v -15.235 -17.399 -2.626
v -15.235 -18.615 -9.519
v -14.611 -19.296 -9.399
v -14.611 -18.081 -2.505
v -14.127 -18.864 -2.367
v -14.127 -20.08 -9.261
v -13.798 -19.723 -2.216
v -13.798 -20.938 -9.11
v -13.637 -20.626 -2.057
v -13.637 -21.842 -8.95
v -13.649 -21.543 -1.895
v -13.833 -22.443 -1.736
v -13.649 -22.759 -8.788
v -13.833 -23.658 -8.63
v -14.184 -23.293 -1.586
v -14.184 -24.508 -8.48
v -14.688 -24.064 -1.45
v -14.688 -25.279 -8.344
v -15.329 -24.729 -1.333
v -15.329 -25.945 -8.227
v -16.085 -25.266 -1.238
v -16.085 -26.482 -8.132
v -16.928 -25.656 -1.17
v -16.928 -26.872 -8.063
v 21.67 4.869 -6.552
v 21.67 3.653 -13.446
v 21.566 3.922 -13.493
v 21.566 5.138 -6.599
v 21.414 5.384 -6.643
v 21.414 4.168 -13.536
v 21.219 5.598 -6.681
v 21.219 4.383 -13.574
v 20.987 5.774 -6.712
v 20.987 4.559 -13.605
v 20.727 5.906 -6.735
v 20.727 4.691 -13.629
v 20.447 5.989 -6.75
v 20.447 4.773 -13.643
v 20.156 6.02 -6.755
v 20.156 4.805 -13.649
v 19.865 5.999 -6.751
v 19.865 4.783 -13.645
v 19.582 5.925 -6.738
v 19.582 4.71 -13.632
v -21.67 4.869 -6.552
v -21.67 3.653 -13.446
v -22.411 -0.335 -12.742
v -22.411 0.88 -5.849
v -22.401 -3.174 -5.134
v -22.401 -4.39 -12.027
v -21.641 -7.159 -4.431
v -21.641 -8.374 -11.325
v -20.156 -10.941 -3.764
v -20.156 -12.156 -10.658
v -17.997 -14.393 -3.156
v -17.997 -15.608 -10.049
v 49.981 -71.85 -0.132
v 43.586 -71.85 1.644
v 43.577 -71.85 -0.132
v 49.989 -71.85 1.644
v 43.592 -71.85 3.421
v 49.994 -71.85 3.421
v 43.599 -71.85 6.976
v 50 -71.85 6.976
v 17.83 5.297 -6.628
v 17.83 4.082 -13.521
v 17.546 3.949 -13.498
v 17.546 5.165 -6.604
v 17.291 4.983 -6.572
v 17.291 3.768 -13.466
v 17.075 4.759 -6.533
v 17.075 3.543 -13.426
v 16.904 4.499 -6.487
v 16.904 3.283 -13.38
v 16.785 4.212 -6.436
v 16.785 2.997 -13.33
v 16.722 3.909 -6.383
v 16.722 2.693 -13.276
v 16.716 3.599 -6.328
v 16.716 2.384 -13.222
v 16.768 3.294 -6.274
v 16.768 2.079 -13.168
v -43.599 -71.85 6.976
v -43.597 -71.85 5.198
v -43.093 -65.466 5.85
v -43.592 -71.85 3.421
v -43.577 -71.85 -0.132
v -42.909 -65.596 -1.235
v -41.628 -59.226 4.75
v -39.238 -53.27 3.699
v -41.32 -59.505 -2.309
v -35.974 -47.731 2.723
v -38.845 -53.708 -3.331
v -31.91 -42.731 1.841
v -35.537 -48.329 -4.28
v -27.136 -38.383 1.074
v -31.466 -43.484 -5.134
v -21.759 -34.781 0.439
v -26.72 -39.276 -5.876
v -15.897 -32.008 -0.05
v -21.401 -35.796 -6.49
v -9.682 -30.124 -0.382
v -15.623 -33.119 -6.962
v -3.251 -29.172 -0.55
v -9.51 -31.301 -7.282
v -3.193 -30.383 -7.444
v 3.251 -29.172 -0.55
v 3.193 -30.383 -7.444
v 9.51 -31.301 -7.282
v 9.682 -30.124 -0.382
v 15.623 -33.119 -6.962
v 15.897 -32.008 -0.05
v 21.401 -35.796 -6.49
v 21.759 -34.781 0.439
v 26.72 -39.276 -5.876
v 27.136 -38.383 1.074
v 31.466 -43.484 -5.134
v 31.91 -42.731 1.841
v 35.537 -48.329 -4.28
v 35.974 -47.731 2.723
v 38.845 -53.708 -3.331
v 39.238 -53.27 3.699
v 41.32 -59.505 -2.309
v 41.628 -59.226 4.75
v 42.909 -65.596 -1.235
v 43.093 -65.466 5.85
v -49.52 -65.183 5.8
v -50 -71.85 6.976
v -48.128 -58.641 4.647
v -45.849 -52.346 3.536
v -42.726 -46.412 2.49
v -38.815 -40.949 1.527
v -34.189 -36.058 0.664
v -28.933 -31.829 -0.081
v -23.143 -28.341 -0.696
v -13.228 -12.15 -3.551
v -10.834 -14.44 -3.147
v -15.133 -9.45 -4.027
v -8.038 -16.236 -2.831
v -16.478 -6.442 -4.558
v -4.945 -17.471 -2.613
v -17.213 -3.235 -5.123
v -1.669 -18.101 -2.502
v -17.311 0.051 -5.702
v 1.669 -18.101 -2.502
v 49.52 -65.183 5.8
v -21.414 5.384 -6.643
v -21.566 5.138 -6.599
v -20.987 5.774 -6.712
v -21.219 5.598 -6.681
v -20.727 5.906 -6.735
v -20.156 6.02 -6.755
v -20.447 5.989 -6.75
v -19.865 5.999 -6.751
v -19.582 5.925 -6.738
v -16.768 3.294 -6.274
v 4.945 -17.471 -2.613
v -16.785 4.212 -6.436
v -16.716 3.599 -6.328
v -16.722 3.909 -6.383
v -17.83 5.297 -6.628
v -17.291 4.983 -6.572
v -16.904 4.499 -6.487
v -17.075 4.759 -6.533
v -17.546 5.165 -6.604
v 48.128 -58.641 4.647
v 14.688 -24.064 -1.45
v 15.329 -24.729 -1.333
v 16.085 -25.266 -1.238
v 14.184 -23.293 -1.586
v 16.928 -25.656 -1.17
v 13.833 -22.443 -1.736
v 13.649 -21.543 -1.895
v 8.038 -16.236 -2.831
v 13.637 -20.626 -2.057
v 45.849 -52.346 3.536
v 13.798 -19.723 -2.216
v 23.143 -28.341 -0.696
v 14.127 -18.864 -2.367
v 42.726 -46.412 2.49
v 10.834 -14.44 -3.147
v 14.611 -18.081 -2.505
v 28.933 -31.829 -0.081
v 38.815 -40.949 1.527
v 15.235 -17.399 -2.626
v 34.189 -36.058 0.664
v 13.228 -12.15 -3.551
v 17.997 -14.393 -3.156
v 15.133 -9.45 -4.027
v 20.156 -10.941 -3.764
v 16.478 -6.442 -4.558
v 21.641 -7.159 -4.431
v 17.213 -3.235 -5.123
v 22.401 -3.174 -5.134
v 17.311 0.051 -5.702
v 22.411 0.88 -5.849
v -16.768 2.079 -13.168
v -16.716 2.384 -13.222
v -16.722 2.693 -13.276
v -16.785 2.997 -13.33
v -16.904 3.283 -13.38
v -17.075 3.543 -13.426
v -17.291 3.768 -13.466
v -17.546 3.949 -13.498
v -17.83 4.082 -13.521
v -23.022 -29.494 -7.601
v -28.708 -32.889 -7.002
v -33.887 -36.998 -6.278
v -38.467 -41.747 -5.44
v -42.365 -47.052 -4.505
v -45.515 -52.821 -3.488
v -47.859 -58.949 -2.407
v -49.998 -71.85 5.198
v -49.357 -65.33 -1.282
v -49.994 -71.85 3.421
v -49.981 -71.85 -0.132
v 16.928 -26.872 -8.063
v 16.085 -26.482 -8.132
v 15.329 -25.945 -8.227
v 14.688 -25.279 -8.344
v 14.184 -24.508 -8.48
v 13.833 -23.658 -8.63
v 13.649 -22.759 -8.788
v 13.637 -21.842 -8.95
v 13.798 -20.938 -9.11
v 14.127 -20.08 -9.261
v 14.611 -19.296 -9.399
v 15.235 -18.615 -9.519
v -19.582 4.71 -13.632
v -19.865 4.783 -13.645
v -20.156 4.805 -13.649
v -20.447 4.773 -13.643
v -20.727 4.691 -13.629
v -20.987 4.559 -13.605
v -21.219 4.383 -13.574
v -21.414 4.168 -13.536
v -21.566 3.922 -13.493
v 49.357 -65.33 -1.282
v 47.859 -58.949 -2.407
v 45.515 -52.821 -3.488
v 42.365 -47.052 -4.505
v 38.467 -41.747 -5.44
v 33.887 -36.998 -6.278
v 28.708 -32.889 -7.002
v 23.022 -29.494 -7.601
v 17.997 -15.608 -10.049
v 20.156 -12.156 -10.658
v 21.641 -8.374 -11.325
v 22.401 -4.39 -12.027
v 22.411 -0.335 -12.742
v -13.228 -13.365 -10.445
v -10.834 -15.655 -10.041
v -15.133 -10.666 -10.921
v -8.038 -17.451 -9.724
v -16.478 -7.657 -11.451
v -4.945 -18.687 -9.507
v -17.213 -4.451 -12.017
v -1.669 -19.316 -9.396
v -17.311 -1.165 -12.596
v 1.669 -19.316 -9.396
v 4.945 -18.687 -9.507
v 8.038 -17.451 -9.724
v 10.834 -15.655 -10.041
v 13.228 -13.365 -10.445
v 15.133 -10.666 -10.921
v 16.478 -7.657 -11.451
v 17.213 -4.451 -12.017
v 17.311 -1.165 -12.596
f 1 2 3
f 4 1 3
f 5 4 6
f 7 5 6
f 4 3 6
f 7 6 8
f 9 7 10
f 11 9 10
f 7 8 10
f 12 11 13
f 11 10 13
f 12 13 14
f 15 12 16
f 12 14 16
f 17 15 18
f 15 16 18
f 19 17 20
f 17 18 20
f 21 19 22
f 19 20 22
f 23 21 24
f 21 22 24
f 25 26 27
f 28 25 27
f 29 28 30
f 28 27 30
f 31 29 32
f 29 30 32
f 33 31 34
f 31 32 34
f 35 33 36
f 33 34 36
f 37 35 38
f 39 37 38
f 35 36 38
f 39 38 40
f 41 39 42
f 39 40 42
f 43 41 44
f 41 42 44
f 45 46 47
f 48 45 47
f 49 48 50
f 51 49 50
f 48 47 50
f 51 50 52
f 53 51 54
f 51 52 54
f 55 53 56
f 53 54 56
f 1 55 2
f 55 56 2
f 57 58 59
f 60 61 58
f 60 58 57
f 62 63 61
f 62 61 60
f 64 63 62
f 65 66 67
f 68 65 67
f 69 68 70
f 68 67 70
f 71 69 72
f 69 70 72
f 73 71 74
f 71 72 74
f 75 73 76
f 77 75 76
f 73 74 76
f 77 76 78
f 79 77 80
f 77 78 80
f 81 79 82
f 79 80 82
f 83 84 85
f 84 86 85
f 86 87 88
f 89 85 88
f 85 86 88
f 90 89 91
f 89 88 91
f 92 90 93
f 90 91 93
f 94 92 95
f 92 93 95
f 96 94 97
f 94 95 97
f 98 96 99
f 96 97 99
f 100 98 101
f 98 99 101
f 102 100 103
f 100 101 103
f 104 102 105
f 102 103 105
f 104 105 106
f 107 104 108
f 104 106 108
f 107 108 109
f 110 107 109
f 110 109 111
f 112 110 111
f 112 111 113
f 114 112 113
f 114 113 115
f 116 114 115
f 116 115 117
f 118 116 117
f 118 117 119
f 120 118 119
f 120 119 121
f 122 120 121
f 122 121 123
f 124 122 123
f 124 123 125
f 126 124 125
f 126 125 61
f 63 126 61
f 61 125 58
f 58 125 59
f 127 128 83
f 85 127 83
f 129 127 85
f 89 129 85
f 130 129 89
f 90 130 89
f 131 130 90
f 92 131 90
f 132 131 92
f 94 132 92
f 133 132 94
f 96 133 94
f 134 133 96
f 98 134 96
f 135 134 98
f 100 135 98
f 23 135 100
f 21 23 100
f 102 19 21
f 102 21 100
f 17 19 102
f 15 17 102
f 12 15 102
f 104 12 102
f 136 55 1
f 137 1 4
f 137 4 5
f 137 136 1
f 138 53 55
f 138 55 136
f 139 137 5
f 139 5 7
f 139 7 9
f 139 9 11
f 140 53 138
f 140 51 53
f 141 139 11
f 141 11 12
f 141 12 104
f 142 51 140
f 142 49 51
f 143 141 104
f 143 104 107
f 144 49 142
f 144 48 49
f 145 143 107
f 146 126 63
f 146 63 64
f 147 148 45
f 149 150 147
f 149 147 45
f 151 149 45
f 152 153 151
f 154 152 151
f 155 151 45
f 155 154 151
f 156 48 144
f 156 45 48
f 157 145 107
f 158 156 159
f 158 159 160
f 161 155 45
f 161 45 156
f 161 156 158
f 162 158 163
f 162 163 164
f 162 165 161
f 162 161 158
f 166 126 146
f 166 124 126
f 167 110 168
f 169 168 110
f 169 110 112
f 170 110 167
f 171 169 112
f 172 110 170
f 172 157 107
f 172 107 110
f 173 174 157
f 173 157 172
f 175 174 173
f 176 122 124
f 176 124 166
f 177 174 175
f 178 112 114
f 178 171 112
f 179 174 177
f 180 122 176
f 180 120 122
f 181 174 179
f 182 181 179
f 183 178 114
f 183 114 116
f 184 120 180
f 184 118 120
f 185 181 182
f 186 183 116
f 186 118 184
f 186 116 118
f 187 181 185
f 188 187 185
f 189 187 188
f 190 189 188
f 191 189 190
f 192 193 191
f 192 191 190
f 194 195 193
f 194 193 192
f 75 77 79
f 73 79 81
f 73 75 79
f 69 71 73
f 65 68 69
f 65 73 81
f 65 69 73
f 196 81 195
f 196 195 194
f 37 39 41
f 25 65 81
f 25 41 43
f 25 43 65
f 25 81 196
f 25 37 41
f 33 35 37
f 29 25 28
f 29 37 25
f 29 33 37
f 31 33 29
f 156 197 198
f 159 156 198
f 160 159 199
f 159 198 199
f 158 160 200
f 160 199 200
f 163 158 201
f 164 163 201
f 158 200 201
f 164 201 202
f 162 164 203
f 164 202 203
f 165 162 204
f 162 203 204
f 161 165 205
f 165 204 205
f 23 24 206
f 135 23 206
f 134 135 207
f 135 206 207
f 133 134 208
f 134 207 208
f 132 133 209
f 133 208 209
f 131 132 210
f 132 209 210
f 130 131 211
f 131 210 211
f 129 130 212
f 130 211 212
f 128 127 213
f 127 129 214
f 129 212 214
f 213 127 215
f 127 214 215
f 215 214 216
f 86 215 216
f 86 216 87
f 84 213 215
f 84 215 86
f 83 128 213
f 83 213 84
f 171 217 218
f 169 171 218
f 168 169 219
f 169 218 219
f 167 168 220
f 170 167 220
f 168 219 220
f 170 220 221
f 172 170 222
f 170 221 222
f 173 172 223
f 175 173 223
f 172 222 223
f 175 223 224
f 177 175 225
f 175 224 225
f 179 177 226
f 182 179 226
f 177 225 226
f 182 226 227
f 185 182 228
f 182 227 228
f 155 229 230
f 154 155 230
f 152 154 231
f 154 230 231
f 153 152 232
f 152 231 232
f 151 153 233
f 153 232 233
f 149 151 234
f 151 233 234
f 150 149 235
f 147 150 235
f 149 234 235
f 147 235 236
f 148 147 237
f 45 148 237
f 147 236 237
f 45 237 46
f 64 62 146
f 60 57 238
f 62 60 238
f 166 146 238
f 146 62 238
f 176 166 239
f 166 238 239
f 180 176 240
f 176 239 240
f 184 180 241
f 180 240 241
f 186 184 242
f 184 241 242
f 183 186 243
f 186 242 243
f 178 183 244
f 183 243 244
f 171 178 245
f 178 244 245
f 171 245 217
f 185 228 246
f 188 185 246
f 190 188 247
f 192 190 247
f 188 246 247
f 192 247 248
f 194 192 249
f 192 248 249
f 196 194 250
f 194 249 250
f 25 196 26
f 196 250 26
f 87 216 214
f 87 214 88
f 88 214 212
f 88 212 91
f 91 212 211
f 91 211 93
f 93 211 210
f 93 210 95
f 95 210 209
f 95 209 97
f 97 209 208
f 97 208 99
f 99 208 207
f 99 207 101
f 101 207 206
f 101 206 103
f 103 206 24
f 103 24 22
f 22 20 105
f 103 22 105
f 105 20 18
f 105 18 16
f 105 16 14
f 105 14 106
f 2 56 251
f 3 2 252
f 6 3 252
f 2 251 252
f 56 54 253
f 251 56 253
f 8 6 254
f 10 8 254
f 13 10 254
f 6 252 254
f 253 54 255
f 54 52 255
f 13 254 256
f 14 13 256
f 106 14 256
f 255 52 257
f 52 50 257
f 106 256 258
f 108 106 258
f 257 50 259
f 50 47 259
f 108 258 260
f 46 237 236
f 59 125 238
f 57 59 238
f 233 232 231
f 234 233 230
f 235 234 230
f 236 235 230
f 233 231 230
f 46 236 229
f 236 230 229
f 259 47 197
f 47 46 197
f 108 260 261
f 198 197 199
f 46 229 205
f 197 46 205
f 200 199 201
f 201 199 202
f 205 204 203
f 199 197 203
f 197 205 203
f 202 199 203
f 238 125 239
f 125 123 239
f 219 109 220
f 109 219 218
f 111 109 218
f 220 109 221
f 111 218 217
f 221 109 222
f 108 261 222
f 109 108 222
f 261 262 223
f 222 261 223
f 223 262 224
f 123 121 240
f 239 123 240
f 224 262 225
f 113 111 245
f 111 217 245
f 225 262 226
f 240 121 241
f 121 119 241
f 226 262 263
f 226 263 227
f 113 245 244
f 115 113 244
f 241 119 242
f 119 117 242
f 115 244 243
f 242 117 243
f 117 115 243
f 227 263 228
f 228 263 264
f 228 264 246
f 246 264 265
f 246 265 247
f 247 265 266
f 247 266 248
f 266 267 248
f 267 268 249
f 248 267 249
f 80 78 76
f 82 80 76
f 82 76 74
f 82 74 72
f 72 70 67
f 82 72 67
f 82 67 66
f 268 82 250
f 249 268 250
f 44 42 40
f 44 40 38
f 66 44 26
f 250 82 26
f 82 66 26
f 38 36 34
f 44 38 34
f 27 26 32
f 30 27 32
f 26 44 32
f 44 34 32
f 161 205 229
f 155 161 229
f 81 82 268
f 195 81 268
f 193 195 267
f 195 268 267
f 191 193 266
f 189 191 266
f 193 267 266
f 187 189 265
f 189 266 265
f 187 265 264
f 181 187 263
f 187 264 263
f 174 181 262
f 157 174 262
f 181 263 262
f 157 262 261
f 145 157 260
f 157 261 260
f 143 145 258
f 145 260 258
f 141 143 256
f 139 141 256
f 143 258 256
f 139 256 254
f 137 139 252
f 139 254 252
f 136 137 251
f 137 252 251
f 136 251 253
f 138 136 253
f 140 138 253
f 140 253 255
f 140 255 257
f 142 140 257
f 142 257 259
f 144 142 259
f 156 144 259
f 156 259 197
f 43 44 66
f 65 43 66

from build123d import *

# Parameters (mm, degrees)
F1_DEPTH = 7
F2_ANGLE = -10
F3_W     = 126.412388
F3_H     = 62.651056
F4_DEPTH = 25


with BuildPart() as f1:
    # F0 (on Top) → F1 (new body)
    with BuildSketch(Plane.XY):
        with BuildLine():
            ThreePointArc((16.768167, 4.455454), (0, -17.35), (-16.768167, 4.455454))
            ThreePointArc((-16.768167, 4.455454), (-16.904061, 5.67856), (-17.829723, 6.489489))
            Line((-17.829723, 6.489489), (-19.581941, 7.127244))
            ThreePointArc((-19.581941, 7.127244), (-20.860413, 7.046862), (-21.670162, 6.054261))
            ThreePointArc((-21.670162, 6.054261), (-21.640699, -6.158747), (-15.235151, -16.557179))
            ThreePointArc((-15.235151, -16.557179), (-13.719641, -21.22611), (-16.927946, -24.941278))
            ThreePointArc((-16.927946, -24.941278), (-40.904751, -43.234384), (-50, -71.988538))
            Line((-50, -71.988538), (-43.59892, -71.988538))
            ThreePointArc((-43.59892, -71.988538), (0, -28.389618), (43.59892, -71.988538))
            Line((43.59892, -71.988538), (50, -71.988538))
            ThreePointArc((50, -71.988538), (40.904751, -43.234384), (16.927946, -24.941278))
            ThreePointArc((16.927946, -24.941278), (13.719641, -21.22611), (15.235151, -16.557179))
            ThreePointArc((15.235151, -16.557179), (21.640699, -6.158747), (21.670162, 6.054261))
            ThreePointArc((21.670162, 6.054261), (20.860413, 7.046862), (19.581941, 7.127244))
            Line((19.581941, 7.127244), (17.829723, 6.489489))
            ThreePointArc((17.829723, 6.489489), (16.904061, 5.67856), (16.768167, 4.455454))
        make_face()
    extrude(amount=F1_DEPTH)


with BuildPart() as f1_1:
    # F2: moved
    add(f1.part.rotate(Axis((-46.79946, -71.988538, 7), (1, 0, 0)), F2_ANGLE))


with BuildPart() as f4:
    # F3 (on Front) → F4 (new body)
    with BuildSketch(Plane.XZ):
        with Locations((-1.744712, 3.013594)):
            Rectangle(F3_W, F3_H)
    extrude(amount=F4_DEPTH)


with BuildPart() as f4_1:
    # F5: moved
    add(f4.part.moved(Location((0, -71.85045, 0))))


with BuildPart() as f1_2:
    add(f1_1.part)

    # F6: cut F4
    add(f4_1.part, mode=Mode.SUBTRACT)


solid = f1_2.part
